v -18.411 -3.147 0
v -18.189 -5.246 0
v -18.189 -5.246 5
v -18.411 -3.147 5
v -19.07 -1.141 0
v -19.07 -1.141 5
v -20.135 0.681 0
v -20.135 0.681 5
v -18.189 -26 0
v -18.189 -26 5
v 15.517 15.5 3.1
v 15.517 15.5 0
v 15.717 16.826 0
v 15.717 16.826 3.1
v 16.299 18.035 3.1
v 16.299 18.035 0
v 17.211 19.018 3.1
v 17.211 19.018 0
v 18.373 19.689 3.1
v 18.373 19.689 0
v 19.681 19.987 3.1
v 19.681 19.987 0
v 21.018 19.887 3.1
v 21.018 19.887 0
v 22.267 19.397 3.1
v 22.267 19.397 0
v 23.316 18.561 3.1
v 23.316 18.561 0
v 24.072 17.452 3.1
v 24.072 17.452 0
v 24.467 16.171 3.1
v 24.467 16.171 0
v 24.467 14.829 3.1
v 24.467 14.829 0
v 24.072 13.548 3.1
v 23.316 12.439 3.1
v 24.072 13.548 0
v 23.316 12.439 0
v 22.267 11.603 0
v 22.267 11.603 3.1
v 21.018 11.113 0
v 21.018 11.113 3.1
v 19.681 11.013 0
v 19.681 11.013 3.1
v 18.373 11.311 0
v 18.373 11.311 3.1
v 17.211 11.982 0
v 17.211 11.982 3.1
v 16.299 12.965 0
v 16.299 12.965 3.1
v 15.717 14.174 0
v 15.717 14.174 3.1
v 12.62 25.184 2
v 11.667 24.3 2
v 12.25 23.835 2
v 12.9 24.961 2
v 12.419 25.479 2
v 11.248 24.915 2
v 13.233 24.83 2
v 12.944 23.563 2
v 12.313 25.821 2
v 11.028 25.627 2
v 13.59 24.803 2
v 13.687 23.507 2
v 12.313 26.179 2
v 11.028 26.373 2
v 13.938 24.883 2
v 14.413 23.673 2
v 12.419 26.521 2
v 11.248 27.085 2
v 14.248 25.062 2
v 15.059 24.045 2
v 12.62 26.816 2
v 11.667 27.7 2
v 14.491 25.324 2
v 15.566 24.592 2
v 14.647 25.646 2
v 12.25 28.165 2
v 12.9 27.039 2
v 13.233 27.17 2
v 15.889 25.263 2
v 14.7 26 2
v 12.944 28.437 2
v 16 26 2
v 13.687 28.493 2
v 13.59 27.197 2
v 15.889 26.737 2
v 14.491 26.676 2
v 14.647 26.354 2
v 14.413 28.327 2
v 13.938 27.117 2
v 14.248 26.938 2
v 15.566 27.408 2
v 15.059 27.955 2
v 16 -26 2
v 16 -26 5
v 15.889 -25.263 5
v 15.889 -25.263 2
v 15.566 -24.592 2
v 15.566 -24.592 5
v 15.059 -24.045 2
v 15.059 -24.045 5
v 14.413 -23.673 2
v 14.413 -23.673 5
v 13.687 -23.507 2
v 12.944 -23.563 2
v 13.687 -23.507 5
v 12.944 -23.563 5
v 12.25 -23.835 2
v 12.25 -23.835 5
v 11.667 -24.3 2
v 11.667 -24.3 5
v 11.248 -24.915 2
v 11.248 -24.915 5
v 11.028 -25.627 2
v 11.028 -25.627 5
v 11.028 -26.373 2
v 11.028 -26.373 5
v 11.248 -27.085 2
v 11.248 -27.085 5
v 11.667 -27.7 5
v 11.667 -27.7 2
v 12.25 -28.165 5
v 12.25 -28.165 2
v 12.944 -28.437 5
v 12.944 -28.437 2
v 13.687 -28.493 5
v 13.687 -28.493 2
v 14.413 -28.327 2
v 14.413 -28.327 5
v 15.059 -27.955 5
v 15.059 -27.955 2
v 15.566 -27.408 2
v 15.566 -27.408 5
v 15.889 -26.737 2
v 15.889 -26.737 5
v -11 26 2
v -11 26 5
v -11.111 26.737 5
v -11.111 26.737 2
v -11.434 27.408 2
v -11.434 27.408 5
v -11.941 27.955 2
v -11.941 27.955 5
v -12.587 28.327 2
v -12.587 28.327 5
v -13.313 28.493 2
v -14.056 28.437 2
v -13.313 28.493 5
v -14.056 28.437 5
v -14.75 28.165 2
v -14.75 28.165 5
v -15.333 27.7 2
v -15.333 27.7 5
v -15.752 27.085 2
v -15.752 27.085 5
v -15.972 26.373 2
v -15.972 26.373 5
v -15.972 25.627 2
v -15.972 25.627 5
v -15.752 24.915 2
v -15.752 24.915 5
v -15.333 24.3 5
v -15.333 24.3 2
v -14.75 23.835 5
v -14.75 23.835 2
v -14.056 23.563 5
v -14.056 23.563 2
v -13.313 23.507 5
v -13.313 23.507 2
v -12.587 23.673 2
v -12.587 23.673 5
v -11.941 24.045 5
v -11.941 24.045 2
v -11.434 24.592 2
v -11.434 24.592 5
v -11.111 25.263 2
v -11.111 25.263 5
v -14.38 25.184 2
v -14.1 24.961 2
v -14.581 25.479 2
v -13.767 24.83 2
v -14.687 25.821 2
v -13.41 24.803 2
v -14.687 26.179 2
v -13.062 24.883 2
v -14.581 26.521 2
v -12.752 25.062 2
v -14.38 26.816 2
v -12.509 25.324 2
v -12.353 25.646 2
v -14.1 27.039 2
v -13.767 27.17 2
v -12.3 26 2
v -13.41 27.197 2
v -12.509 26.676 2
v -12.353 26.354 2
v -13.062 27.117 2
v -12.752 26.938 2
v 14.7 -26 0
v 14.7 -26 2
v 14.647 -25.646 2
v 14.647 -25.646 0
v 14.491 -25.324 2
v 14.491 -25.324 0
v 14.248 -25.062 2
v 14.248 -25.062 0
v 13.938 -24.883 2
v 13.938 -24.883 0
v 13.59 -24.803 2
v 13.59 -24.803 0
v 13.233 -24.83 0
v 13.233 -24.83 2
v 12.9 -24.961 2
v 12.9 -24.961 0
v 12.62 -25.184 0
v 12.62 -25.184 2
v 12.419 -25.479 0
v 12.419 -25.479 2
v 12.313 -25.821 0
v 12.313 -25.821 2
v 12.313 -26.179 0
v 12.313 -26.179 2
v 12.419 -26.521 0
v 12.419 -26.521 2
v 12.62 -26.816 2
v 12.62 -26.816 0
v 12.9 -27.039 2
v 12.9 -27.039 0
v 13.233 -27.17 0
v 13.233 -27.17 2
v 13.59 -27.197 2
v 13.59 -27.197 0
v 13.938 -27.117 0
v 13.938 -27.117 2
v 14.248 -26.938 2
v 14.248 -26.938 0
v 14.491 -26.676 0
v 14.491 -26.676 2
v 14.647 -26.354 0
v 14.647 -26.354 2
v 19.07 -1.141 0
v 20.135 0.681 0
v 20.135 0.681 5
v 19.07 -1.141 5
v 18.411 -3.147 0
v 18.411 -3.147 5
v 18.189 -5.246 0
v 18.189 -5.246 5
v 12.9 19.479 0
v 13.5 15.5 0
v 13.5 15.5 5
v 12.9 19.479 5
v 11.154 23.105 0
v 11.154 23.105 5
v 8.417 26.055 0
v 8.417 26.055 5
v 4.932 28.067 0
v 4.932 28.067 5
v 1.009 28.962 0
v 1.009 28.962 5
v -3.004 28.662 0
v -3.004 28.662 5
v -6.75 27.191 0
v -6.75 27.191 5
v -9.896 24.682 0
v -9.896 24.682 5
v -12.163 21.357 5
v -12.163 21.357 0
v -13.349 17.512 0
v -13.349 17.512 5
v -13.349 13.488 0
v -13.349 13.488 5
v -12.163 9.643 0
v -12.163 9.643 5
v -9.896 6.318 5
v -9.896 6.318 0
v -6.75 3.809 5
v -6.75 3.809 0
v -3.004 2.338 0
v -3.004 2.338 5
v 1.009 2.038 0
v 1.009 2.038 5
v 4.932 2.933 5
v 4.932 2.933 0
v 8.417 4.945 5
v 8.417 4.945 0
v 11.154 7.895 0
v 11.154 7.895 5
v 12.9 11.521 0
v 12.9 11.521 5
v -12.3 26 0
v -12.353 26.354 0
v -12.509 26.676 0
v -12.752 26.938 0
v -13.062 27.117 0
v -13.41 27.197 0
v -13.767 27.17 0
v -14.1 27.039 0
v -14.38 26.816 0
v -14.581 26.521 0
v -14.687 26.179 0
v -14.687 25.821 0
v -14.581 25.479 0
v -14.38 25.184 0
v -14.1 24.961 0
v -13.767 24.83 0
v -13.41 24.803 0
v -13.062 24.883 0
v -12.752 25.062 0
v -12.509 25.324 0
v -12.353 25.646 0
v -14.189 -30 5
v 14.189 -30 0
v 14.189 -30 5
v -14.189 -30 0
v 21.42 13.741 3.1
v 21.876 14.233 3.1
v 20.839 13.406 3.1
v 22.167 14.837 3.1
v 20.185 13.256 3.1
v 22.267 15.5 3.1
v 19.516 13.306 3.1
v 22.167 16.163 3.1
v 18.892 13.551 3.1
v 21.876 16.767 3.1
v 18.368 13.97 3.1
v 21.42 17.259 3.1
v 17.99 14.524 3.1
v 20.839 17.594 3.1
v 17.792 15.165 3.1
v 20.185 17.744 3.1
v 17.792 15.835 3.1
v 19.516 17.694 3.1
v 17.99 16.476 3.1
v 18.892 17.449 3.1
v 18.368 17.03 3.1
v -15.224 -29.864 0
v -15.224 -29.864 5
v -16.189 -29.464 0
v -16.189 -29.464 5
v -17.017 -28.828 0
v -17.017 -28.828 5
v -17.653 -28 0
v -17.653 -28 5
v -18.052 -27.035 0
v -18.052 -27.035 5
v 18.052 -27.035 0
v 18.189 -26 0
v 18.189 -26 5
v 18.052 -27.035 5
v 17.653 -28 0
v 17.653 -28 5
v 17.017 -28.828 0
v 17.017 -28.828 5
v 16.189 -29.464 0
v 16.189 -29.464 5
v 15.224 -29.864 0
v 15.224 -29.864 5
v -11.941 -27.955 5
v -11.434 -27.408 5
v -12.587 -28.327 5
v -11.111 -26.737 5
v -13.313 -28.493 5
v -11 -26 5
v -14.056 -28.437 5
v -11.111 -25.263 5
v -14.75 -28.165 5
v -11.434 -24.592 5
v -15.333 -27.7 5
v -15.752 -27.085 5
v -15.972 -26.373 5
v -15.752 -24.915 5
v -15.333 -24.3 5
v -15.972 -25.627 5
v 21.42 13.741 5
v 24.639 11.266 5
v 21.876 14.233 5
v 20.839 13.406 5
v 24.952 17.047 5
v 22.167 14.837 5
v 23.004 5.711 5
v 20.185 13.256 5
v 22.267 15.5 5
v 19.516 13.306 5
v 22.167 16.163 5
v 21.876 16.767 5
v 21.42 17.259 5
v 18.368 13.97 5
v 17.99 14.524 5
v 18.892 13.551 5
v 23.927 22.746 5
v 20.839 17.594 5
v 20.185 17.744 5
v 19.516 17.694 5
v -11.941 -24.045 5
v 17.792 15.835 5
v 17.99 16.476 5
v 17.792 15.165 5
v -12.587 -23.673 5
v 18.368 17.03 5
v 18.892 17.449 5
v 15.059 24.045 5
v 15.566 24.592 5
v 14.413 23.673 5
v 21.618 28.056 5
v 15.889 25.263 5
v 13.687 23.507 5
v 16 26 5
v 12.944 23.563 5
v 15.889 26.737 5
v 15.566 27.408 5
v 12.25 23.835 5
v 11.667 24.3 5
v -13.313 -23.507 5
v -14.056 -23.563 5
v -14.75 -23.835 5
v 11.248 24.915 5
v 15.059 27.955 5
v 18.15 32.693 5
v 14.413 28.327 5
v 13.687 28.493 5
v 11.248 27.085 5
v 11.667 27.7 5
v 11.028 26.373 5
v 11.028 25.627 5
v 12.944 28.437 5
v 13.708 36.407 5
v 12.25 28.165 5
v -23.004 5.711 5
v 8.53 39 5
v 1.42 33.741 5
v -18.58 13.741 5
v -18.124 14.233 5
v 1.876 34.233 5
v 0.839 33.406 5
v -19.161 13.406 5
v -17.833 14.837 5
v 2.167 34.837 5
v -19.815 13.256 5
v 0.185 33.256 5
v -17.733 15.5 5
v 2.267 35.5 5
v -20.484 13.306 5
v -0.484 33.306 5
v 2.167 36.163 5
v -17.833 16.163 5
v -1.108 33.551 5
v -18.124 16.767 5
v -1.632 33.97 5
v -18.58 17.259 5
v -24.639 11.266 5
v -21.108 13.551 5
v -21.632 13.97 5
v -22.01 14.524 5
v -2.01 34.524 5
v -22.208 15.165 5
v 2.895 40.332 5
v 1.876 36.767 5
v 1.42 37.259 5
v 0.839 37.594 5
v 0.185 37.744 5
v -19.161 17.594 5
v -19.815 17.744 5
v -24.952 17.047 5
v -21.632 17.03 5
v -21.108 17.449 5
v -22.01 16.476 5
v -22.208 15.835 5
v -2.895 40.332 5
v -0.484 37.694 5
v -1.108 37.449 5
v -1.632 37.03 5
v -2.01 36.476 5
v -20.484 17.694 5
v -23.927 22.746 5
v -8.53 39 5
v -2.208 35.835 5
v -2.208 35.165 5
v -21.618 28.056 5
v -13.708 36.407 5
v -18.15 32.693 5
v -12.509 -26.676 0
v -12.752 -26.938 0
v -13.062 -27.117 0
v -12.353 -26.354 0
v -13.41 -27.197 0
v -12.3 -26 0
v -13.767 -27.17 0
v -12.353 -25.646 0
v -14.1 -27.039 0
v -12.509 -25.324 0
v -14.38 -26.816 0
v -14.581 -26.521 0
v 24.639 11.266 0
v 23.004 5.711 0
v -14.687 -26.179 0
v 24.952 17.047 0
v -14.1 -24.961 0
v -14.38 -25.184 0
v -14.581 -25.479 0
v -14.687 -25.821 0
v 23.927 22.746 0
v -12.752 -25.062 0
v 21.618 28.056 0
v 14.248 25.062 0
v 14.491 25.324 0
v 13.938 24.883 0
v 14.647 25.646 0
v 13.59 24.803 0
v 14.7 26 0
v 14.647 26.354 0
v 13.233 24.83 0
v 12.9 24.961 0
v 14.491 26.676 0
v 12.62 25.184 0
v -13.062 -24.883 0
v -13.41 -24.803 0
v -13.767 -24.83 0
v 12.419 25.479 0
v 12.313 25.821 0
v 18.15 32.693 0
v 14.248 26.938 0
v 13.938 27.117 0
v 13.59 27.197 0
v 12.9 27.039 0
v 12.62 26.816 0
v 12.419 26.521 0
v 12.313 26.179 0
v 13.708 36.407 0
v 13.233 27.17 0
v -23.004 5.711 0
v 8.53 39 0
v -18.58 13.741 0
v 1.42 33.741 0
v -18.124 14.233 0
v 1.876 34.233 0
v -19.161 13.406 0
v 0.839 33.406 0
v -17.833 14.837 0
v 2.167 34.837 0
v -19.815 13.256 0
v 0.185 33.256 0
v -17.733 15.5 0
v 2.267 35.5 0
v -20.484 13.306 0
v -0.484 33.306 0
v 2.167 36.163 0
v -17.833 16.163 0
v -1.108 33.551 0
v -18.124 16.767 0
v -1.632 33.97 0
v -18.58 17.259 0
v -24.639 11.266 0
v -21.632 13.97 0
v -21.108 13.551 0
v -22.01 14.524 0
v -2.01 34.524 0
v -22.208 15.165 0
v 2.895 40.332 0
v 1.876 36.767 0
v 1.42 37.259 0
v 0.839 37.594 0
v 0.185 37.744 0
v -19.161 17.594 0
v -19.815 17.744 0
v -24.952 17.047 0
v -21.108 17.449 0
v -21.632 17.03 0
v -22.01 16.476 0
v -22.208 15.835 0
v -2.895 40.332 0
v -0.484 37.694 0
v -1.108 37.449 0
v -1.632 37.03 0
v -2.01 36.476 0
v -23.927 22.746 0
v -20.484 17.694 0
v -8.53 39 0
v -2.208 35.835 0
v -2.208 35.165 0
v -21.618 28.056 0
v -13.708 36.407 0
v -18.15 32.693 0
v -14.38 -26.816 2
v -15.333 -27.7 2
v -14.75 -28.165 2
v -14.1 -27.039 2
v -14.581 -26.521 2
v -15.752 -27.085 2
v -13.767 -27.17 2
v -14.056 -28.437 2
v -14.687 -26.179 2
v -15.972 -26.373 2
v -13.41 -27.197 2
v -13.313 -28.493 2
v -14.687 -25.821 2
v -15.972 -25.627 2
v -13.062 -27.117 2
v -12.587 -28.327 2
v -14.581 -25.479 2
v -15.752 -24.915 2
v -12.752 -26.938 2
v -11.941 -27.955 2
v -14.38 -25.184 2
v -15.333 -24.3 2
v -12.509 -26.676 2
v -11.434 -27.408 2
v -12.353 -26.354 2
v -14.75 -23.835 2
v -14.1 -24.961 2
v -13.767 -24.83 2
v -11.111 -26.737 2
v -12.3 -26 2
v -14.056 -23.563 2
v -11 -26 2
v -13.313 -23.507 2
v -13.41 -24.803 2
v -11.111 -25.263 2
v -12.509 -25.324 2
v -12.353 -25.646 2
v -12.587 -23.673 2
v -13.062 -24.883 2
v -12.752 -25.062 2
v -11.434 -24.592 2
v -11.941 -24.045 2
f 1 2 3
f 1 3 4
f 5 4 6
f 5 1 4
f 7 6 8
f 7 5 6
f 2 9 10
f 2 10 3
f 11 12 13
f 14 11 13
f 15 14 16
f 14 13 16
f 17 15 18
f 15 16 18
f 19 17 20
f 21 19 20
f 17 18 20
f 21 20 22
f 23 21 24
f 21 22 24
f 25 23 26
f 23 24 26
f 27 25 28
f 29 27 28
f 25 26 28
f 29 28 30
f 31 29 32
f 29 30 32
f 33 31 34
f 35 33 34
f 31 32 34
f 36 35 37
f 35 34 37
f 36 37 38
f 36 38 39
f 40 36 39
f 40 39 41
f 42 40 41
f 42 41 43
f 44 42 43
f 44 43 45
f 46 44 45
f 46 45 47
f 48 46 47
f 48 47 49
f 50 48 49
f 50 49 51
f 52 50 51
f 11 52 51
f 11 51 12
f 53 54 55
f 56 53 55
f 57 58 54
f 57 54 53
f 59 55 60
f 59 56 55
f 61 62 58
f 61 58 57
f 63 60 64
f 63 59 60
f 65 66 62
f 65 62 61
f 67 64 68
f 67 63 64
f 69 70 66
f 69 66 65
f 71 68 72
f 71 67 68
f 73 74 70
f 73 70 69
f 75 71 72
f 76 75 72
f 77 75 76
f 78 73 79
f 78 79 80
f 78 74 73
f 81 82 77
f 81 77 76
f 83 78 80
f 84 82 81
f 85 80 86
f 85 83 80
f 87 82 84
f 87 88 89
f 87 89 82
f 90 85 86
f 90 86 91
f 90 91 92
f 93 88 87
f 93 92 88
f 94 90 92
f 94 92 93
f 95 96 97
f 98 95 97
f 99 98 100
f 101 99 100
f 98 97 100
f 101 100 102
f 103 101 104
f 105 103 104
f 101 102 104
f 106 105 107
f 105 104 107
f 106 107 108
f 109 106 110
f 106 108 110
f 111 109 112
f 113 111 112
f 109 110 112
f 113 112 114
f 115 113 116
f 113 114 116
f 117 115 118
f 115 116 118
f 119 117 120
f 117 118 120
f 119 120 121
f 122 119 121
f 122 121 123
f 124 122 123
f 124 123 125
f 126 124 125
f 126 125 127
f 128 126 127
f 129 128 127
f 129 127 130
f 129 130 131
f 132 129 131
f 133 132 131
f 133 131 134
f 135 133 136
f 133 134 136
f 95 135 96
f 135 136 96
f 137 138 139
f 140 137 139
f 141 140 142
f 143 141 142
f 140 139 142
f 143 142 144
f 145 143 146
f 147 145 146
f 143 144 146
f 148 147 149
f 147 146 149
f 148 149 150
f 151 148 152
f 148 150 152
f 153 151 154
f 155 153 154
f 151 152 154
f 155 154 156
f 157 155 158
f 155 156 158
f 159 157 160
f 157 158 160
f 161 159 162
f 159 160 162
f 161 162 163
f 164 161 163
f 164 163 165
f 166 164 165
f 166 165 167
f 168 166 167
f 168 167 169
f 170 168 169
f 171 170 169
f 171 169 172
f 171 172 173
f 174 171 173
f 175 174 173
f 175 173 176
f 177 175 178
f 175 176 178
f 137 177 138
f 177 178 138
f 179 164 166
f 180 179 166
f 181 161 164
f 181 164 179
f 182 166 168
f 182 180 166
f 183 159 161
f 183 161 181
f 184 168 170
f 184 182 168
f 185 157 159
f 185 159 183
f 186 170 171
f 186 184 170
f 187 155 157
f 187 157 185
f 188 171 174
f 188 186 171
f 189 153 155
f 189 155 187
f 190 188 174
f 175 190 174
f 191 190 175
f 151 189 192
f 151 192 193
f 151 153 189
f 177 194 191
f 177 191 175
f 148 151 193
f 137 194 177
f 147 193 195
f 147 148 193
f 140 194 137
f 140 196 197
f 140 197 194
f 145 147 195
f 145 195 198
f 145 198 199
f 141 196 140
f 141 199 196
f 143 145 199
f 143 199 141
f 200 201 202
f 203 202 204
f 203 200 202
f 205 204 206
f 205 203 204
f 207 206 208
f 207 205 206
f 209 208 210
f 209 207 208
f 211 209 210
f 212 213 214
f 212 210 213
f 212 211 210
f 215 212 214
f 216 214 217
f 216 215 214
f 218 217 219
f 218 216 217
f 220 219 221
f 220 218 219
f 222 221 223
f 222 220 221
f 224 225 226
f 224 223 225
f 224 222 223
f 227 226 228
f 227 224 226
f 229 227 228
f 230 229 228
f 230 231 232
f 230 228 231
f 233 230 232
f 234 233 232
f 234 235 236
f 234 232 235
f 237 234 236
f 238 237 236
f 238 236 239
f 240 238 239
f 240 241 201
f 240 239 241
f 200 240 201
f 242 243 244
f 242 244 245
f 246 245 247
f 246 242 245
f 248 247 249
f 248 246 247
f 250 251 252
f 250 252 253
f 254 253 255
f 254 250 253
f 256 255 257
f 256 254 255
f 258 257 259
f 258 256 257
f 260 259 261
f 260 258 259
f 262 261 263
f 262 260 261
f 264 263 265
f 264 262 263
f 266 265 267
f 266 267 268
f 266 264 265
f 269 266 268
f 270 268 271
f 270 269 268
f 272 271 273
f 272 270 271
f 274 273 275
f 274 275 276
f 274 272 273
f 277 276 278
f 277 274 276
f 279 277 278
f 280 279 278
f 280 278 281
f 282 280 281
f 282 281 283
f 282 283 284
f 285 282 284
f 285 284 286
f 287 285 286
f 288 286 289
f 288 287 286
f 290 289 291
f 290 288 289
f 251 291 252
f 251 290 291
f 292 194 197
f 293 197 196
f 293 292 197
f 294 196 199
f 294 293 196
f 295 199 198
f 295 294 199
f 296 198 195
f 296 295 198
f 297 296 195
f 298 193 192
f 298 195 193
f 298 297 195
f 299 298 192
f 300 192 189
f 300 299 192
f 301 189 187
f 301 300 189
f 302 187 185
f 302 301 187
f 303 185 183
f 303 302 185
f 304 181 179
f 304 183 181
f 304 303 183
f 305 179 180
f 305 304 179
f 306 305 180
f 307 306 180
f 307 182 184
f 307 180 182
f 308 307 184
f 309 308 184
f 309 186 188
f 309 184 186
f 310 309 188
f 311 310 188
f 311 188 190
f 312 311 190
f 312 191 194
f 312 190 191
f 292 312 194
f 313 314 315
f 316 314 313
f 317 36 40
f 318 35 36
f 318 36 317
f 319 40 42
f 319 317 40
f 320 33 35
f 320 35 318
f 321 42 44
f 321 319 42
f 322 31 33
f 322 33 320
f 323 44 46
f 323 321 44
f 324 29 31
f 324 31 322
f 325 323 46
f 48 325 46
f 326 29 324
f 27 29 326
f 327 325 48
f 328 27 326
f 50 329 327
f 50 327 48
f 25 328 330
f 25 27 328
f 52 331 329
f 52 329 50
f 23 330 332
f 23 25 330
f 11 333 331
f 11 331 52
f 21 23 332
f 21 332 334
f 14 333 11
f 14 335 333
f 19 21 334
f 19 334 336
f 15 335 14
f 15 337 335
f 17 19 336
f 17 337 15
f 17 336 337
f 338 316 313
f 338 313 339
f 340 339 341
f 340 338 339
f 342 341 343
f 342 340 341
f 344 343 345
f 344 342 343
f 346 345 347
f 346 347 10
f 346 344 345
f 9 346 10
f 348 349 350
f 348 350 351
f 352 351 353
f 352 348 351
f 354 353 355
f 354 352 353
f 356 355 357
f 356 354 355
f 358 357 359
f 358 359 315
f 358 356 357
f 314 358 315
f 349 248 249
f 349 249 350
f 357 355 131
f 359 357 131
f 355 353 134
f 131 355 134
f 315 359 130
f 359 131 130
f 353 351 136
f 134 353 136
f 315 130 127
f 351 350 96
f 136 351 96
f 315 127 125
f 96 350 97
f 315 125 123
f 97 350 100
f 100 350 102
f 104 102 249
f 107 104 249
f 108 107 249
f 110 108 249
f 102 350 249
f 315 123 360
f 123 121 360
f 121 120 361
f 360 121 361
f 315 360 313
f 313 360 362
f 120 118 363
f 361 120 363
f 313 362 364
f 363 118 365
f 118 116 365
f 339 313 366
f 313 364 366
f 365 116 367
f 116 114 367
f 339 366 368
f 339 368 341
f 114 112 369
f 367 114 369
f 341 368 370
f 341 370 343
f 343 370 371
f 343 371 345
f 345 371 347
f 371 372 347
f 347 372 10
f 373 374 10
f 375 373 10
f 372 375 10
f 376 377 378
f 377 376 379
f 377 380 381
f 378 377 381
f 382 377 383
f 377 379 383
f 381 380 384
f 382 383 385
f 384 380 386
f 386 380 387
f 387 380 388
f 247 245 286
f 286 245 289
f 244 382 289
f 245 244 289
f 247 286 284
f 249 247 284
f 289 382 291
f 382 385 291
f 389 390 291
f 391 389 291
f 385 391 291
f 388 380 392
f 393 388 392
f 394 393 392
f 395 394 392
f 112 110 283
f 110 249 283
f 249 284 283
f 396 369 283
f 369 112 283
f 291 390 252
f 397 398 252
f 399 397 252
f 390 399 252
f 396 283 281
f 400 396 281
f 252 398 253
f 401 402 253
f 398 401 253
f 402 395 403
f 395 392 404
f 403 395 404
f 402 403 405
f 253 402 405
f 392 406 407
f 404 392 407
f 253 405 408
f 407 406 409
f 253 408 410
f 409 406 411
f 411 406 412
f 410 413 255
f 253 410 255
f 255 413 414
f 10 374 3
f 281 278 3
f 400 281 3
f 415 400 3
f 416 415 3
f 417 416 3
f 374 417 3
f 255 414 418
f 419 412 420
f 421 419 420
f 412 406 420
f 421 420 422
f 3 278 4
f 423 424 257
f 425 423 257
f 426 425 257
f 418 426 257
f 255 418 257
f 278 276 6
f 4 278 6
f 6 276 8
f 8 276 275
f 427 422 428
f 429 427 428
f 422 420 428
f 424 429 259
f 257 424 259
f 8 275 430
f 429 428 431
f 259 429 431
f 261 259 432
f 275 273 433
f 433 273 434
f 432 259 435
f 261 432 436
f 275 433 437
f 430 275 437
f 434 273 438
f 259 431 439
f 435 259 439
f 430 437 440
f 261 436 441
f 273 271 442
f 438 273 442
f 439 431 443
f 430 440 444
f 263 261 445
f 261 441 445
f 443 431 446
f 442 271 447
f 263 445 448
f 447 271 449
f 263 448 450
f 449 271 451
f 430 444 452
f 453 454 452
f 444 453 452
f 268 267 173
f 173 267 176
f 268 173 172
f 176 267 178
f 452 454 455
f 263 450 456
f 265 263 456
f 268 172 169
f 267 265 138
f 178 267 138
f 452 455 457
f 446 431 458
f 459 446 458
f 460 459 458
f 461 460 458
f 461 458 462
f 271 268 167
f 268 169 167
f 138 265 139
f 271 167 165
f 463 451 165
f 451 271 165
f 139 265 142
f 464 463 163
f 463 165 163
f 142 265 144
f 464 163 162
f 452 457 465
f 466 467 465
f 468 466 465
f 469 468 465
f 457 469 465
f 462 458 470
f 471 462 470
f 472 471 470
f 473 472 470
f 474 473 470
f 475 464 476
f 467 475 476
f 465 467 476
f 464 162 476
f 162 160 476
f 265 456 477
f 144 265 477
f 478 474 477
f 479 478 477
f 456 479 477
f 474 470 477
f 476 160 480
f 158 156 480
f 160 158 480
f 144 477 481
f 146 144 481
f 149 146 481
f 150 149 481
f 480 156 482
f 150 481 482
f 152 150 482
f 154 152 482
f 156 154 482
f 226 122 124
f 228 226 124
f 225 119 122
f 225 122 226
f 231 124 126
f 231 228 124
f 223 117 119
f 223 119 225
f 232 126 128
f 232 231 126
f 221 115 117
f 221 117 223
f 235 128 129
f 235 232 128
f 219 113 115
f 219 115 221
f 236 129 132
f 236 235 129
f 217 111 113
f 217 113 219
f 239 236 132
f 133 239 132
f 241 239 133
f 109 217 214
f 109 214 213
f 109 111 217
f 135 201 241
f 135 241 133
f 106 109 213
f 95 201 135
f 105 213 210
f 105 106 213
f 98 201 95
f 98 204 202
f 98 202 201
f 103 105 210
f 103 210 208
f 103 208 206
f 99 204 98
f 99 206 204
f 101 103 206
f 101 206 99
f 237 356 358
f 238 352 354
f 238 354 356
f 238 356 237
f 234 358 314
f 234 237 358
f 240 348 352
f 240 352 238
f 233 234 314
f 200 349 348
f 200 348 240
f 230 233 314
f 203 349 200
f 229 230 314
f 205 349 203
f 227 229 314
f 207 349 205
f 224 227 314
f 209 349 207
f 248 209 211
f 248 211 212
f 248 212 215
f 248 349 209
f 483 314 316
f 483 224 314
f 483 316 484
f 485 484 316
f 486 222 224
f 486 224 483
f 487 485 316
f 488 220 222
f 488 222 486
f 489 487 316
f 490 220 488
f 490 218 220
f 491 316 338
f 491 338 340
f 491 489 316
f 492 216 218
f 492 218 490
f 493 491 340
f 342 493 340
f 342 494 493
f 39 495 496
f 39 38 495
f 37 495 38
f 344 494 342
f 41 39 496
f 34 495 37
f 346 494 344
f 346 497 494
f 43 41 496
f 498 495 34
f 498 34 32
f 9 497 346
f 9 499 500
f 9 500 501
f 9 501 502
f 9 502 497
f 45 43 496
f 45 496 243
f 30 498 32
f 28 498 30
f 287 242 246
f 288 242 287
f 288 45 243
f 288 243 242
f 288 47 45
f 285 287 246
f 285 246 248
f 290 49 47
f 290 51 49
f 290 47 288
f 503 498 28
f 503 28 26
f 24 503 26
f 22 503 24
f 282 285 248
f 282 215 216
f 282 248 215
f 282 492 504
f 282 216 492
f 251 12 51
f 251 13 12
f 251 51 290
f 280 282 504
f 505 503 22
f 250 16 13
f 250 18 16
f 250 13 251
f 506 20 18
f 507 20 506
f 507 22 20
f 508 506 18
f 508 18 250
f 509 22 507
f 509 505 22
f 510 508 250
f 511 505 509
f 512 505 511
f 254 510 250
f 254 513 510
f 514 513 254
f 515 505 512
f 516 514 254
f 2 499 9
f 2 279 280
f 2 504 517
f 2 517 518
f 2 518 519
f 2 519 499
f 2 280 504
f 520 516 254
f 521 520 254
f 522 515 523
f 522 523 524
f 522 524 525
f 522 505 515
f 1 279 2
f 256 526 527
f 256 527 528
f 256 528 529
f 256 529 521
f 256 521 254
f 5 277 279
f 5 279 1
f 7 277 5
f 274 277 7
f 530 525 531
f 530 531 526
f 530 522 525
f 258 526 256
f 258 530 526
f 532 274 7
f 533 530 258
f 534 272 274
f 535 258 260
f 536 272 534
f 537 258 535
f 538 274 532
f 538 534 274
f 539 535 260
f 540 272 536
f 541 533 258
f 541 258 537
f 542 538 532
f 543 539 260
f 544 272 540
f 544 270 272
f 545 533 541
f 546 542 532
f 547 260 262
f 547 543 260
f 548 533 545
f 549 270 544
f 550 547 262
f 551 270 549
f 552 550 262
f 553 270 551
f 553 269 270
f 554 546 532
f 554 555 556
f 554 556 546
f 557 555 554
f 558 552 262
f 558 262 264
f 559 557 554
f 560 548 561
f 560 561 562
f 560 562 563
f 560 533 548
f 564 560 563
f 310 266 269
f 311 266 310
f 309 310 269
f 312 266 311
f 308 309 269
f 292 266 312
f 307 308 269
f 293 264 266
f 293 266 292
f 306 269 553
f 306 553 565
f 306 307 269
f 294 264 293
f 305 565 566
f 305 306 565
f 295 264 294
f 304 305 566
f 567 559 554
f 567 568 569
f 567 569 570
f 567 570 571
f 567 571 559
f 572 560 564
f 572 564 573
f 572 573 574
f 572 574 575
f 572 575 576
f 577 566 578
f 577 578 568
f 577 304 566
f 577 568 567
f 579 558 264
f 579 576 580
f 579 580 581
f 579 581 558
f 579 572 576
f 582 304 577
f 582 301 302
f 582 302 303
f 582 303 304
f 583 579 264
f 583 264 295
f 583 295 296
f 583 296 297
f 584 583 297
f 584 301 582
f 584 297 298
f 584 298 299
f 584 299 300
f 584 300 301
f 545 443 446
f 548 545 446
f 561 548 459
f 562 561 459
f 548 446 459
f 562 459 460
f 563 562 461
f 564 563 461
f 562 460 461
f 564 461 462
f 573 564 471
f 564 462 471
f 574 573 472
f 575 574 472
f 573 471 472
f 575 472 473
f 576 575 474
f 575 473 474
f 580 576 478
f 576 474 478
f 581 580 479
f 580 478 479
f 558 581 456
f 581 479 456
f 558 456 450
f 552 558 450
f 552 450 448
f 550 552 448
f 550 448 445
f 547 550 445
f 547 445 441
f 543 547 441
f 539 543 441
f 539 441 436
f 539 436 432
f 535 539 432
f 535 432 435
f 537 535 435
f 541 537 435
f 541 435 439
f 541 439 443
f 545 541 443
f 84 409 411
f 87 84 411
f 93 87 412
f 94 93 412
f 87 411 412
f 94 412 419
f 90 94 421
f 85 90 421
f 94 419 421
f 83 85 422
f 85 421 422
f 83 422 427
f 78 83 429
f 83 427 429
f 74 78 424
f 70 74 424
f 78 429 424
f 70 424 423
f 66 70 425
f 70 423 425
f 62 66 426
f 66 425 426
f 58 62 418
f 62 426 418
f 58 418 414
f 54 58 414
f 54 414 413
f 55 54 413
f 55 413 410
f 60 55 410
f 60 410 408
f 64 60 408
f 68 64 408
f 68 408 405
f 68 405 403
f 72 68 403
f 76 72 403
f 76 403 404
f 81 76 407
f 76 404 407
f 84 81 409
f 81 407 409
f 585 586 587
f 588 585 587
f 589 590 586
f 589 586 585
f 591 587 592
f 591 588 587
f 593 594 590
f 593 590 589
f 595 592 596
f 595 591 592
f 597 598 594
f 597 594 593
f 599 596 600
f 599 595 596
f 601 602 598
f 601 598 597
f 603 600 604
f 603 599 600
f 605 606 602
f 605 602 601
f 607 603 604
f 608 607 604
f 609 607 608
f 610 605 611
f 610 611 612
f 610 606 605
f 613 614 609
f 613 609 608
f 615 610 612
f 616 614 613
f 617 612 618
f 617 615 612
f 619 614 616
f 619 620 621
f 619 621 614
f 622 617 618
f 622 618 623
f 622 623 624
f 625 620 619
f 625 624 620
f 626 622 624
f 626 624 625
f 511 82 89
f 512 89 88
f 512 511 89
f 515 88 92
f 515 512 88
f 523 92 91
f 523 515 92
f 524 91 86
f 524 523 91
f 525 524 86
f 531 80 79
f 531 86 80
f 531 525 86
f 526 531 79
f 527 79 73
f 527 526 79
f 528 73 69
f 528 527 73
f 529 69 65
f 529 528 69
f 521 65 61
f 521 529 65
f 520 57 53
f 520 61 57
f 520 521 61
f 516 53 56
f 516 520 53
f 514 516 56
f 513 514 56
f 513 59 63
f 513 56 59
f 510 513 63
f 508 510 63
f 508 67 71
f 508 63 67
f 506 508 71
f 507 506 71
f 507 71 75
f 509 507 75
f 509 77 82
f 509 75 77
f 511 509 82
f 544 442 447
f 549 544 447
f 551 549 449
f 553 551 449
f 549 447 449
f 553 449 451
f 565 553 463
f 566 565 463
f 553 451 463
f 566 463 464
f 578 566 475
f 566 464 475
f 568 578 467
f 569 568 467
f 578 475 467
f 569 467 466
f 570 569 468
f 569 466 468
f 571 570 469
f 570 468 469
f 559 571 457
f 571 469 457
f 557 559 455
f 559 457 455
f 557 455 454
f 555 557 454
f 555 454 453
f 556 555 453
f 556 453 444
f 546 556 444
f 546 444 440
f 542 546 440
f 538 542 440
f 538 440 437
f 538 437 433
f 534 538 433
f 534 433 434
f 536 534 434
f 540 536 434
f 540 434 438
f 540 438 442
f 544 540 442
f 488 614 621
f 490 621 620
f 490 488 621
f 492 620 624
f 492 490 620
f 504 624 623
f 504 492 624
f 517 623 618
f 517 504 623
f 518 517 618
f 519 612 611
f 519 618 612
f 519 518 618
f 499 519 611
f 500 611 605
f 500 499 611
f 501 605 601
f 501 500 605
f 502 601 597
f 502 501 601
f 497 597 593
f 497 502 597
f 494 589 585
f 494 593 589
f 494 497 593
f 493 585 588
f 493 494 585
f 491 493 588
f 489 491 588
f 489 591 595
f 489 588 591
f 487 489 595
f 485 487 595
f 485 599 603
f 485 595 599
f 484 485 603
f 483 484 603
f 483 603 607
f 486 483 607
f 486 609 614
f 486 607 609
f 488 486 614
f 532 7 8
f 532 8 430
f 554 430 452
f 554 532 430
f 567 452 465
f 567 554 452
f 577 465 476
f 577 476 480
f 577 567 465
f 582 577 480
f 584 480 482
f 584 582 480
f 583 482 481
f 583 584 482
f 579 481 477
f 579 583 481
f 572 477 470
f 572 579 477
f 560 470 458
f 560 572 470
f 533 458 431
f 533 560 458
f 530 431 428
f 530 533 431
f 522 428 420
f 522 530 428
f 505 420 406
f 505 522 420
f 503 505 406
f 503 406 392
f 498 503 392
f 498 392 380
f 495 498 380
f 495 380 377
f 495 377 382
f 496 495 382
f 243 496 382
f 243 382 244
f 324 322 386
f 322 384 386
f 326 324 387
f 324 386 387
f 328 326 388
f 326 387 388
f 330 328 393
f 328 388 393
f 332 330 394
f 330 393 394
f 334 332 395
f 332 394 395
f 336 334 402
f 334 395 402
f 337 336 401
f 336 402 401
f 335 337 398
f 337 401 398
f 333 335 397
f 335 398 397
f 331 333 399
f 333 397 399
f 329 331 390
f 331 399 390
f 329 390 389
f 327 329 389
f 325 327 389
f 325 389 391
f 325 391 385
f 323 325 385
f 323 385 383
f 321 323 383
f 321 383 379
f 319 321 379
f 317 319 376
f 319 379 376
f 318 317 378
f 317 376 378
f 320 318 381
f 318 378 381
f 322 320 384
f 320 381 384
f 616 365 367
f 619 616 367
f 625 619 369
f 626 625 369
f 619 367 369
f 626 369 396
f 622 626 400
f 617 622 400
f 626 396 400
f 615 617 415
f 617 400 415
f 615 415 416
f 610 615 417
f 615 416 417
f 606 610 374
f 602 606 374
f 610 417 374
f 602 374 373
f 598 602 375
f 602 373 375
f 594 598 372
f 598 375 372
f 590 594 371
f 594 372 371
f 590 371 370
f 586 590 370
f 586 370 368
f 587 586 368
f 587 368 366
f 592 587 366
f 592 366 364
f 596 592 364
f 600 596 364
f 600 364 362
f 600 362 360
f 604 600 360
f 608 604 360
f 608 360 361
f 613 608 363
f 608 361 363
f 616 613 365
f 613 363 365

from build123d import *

# Parameters (mm, degrees)
SKETCH_1_R                   = 1.2
SKETCH_1_R_2                 = 13.5
EXTRUDE_1_DEPTH              = 5
SKETCH_2_R                   = 2.5
CUT_EXTRUDE_1_DEPTH          = 3
SKETCH_3_R                   = 2.25
CUT_EXTRUDE_2_DEPTH          = 1
CUT_EXTRUDE_2_DEPTH_BACK     = 6
HOLE_WIZARD_M4_2_D           = 4.5
HOLE_WIZARD_M4_2_CBORE_D     = 9
HOLE_WIZARD_M4_2_CBORE_DEPTH = 3.1


with BuildPart() as part:
    # 스케치1 → 보스-돌출1 (new body)
    with BuildSketch(Plane.XY):
        with BuildLine():
            Line((18.188636287, -5.246102869), (18.188636287, -26))
            ThreePointArc((18.188636287, -26), (17.017063412, -28.828427125), (14.188636287, -30))
            Line((14.188636287, -30), (-14.188636287, -30))
            ThreePointArc((-14.188636287, -30), (-17.017063412, -28.828427125), (-18.188636287, -26))
            Line((-18.188636287, -26), (-18.188636287, -5.246102869))
            ThreePointArc((-18.188636287, -5.246102869), (-18.687611058, -2.126724792), (-20.134740205, 0.681355093))
            ThreePointArc((-20.134740205, 0.681355093), (0, 40.5), (20.134740205, 0.681355093))
            ThreePointArc((20.134740205, 0.681355093), (18.687611058, -2.126724792), (18.188636287, -5.246102869))
        make_face()
        with Locations((-13.5, 26)):
            Circle(SKETCH_1_R, mode=Mode.SUBTRACT)
        with Locations((13.5, 26)):
            Circle(SKETCH_1_R, mode=Mode.SUBTRACT)
        with Locations((-13.5, -26)):
            Circle(SKETCH_1_R, mode=Mode.SUBTRACT)
        with Locations((13.5, -26)):
            Circle(SKETCH_1_R, mode=Mode.SUBTRACT)
        with Locations((0, 15.5)):
            Circle(SKETCH_1_R_2, mode=Mode.SUBTRACT)
    extrude(amount=EXTRUDE_1_DEPTH)

    # 스케치2 → 컷-돌출1 (cut)
    with BuildSketch(Plane.XY.offset(5)):
        with Locations((-13.5, 26)):
            Circle(SKETCH_2_R)
        with Locations((13.5, 26)):
            Circle(SKETCH_2_R)
        with Locations((-13.5, -26)):
            Circle(SKETCH_2_R)
        with Locations((13.5, -26)):
            Circle(SKETCH_2_R)
    extrude(amount=-CUT_EXTRUDE_1_DEPTH, mode=Mode.SUBTRACT)

    # 스케치3 → 컷-돌출2 (cut, two sides)
    with BuildSketch(Plane.XY.offset(5)) as cut_extrude_2_sk:
        with Locations((-19.982848321, 15.5)):
            Circle(SKETCH_3_R)
        with Locations((0.017151679, 35.5)):
            Circle(SKETCH_3_R)
    extrude(amount=CUT_EXTRUDE_2_DEPTH, mode=Mode.SUBTRACT)
    extrude(cut_extrude_2_sk.sketch, amount=-CUT_EXTRUDE_2_DEPTH_BACK, mode=Mode.SUBTRACT)

    # M4 남비 머리 나사용 카운터보어2 (through all)
    with Locations(Plane(origin=(0, 0, 0), x_dir=(-1, 0, 0), z_dir=(0, 0, -1))):
        with Locations((-20.017151679, 15.5)):
            CounterBoreHole(HOLE_WIZARD_M4_2_D / 2, HOLE_WIZARD_M4_2_CBORE_D / 2, HOLE_WIZARD_M4_2_CBORE_DEPTH)


solid = part.part
